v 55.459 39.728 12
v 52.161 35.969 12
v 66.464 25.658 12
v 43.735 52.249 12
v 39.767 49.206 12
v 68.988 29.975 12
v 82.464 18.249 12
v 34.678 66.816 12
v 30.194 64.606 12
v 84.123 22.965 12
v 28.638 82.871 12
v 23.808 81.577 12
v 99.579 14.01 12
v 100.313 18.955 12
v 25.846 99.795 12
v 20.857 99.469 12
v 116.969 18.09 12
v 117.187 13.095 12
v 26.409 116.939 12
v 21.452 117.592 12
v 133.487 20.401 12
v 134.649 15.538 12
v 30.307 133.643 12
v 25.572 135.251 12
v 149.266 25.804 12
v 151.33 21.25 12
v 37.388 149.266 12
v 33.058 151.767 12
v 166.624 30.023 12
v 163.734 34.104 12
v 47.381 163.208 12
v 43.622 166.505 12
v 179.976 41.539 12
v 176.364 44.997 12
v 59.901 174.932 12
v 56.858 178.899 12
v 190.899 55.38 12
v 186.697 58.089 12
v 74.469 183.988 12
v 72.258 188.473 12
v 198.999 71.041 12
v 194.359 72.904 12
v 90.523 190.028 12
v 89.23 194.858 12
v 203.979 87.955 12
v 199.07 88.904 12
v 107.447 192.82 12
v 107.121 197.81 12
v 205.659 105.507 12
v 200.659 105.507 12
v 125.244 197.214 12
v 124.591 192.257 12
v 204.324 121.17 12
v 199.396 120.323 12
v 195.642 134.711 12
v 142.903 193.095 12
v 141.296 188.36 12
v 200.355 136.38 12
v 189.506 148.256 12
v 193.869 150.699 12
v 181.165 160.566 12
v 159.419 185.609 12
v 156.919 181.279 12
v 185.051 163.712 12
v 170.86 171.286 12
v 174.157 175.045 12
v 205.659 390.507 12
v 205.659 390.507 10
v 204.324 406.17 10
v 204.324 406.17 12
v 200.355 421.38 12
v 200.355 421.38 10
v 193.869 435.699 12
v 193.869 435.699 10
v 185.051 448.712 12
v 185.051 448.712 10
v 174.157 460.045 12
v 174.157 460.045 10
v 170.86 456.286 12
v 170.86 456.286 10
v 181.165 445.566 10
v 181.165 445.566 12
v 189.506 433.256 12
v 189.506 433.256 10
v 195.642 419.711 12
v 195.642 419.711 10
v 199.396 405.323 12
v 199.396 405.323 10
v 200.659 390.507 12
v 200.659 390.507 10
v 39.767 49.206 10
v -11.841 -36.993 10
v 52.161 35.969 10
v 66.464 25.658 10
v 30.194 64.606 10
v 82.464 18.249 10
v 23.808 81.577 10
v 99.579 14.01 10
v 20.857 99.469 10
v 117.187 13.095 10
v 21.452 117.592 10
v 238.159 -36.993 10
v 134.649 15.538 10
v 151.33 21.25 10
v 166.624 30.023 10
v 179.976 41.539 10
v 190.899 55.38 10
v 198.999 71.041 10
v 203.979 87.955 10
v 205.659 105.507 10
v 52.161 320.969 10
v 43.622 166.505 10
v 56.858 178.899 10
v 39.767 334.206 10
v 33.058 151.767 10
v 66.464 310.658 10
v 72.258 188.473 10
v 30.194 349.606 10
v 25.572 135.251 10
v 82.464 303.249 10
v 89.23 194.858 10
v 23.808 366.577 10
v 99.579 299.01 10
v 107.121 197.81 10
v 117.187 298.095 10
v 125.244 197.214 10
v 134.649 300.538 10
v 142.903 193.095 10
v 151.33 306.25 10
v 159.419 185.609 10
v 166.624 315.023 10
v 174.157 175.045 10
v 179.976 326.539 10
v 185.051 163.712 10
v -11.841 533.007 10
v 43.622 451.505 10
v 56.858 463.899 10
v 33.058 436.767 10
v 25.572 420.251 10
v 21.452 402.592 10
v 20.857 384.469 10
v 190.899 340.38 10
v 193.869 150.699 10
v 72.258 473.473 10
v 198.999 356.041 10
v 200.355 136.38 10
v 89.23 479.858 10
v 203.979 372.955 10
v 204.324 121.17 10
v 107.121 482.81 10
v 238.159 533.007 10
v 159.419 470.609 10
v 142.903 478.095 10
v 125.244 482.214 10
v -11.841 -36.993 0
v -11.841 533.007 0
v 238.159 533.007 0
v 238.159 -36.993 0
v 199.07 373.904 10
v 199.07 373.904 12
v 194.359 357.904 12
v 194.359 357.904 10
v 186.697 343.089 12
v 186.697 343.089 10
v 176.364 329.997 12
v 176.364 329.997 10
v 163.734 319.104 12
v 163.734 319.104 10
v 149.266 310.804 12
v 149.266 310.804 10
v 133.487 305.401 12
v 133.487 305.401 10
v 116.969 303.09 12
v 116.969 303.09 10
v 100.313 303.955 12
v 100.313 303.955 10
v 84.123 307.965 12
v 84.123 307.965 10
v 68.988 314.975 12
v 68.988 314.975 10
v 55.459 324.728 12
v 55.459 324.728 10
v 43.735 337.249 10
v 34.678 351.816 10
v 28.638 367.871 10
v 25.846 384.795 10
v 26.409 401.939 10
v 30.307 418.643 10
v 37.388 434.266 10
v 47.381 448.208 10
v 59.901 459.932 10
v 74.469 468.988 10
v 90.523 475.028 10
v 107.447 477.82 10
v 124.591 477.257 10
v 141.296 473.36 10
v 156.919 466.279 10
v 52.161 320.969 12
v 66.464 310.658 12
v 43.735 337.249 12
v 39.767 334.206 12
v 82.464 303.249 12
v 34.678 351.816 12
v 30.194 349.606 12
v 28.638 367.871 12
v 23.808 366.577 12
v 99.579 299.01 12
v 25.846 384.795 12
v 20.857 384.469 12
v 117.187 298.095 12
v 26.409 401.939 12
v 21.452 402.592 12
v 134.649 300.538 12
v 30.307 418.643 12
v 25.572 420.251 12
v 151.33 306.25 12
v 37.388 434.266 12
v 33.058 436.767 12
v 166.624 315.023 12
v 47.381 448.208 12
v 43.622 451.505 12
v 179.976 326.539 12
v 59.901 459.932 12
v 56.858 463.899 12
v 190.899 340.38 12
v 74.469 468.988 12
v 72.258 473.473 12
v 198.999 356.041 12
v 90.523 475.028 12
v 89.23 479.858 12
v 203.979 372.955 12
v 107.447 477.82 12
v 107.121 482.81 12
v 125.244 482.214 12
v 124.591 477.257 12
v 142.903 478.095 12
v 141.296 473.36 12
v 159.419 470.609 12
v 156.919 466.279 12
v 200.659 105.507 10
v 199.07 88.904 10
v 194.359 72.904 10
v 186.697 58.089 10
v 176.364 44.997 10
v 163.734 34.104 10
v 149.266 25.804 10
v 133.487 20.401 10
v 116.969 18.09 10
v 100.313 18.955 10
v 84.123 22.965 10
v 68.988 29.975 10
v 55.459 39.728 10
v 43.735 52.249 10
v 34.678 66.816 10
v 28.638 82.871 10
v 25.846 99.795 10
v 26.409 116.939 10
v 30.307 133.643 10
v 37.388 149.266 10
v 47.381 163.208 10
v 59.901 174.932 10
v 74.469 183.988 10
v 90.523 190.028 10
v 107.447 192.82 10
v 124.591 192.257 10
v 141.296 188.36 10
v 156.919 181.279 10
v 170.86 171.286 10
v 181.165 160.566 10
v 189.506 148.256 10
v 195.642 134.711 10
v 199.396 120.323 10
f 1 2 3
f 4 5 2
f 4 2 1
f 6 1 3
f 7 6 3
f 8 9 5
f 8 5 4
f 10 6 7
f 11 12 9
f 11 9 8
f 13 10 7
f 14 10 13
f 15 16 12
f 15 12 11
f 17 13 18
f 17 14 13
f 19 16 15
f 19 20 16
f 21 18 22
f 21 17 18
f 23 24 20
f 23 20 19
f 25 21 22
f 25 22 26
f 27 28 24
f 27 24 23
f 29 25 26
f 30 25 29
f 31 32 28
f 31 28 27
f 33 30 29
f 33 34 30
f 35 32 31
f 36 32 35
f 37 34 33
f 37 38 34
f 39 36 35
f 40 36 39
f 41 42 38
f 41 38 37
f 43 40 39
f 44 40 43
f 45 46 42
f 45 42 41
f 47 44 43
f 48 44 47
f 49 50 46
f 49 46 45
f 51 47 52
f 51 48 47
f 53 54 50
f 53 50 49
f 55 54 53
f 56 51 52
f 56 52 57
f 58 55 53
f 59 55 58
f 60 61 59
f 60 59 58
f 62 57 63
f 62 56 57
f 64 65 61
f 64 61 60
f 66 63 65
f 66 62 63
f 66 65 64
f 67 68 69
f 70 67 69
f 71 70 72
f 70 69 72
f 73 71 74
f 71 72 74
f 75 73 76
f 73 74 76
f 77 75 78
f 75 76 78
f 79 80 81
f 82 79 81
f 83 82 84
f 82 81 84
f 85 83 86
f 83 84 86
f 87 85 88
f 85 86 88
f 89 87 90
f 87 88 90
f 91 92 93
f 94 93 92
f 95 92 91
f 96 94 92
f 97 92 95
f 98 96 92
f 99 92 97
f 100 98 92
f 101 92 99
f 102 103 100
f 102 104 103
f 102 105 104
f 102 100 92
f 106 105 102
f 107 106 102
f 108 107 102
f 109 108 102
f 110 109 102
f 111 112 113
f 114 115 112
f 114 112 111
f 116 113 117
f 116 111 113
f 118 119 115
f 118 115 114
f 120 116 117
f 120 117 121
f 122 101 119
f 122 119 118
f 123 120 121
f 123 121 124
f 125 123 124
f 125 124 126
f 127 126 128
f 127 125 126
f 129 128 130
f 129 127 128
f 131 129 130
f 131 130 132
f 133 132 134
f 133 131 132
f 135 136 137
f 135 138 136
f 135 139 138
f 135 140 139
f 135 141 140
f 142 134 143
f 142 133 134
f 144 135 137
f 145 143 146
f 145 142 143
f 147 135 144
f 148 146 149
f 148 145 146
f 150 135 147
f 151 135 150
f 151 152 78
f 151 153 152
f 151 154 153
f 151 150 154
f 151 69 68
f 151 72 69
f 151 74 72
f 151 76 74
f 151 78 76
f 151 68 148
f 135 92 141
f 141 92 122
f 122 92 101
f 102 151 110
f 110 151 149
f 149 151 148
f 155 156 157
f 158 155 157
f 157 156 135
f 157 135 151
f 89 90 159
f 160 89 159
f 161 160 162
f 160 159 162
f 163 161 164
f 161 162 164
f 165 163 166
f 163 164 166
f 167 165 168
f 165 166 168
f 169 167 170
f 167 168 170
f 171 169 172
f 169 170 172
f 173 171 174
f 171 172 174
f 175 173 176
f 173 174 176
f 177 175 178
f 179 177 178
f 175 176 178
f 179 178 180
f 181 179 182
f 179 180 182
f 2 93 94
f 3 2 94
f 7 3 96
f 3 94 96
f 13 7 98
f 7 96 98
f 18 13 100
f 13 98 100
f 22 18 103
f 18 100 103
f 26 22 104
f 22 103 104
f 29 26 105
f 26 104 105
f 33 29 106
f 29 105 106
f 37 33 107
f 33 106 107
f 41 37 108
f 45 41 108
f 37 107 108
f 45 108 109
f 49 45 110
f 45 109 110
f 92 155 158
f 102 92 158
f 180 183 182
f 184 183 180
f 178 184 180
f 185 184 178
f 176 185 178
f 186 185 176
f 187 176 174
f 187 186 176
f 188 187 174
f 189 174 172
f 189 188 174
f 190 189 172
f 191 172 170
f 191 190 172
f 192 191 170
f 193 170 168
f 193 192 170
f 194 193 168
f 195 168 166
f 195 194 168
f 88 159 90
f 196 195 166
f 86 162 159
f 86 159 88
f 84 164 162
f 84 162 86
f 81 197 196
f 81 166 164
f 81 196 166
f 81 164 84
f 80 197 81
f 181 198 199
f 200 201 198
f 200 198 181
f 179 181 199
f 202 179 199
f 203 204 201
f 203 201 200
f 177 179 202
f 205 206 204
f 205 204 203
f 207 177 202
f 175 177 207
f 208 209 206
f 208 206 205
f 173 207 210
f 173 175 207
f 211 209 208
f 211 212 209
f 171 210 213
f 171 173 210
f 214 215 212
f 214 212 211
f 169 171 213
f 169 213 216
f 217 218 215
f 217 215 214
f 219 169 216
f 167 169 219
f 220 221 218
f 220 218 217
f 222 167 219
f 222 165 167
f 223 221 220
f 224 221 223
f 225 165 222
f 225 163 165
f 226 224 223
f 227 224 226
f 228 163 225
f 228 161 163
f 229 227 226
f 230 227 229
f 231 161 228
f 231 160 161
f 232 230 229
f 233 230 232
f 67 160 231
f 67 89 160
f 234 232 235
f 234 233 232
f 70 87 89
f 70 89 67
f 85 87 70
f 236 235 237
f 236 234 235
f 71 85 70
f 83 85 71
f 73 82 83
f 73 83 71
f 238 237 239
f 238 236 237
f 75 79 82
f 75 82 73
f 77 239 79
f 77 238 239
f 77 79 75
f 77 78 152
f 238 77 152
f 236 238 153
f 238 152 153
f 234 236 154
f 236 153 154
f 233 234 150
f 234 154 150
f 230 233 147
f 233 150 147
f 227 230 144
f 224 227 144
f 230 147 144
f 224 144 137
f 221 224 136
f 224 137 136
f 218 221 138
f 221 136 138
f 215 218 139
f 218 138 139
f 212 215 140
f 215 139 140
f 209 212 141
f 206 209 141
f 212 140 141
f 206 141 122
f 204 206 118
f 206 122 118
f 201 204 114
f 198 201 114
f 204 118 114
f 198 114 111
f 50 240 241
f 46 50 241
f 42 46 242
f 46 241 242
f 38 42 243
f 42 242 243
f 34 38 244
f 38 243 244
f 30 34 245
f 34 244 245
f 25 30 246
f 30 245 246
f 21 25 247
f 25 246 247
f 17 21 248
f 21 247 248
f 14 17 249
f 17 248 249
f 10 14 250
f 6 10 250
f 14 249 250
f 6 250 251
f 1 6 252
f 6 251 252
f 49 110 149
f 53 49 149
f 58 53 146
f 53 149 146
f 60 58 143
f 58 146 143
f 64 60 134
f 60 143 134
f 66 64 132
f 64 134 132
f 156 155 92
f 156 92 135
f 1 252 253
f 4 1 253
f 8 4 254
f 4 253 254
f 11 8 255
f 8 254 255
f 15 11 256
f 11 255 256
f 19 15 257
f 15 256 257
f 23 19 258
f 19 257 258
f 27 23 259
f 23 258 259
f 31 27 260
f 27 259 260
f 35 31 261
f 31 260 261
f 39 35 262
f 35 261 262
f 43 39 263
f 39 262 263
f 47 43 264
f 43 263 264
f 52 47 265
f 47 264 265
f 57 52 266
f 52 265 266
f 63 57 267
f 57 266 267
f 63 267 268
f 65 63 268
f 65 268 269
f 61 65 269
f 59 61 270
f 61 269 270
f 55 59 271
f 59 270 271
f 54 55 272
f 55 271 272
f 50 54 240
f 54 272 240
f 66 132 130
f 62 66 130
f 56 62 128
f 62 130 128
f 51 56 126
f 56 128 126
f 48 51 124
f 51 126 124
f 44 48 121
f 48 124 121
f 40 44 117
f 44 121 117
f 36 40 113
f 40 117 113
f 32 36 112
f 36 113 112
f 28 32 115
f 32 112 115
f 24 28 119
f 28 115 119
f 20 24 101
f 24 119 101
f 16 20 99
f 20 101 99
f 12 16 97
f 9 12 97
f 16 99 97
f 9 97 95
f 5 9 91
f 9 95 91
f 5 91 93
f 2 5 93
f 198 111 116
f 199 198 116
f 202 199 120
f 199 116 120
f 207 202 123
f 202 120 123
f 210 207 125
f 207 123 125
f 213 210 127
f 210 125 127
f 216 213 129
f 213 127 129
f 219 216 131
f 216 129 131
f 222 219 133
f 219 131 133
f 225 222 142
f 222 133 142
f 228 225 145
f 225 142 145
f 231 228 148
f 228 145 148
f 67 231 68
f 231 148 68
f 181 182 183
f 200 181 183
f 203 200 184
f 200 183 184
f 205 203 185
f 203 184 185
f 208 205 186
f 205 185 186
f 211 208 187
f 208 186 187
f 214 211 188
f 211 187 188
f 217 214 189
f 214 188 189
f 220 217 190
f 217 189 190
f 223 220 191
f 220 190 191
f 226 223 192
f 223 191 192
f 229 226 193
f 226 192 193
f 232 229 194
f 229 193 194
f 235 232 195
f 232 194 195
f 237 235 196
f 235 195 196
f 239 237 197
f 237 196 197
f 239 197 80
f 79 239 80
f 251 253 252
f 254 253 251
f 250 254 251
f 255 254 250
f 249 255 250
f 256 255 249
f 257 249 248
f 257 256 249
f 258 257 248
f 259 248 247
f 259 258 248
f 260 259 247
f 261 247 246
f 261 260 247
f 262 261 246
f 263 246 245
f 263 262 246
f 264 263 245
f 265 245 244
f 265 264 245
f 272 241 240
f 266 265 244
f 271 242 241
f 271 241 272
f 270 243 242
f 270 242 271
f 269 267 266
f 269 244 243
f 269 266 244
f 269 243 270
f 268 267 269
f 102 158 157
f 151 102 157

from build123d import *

# Parameters (mm, degrees)
F0_W     = 250
F0_H     = 570
F1_DEPTH = 10
F3_DEPTH = 2


with BuildPart() as f1:
    # F0 (on Top) → F1 (new body)
    with BuildSketch(Plane.XY):
        with Locations((113.159475, 248.007115)):
            Rectangle(F0_W, F0_H)
    extrude(amount=F1_DEPTH)

    # F2 (on face) → F3 (join)
    with BuildSketch(Plane.XY.offset(10)):
        with BuildLine():
            ThreePointArc((174.157473, 460.044833), (43.621757, 451.505113), (52.161477, 320.969397))
            Line((52.161477, 320.969397), (55.458666, 324.728192))
            ThreePointArc((55.458666, 324.728192), (47.380553, 448.207924), (170.860284, 456.286037))
            Line((170.860284, 456.286037), (174.157473, 460.044833))
        make_face()
        with BuildLine():
            Line((55.458666, 324.728192), (52.161477, 320.969397))
            ThreePointArc((52.161477, 320.969397), (151.32972, 306.249875), (205.659475, 390.507115))
            ThreePointArc((205.659475, 390.507115), (197.416714, 428.67736), (174.157473, 460.044833))
            Line((174.157473, 460.044833), (170.860284, 456.286037))
            ThreePointArc((170.860284, 456.286037), (192.862269, 426.614103), (200.659475, 390.507115))
            ThreePointArc((200.659475, 390.507115), (149.266463, 310.804321), (55.458666, 324.728192))
        make_face()
        with BuildLine():
            ThreePointArc((205.659475, 105.507115), (197.416714, 143.67736), (174.157473, 175.044833))
            Line((174.157473, 175.044833), (170.860284, 171.286037))
            ThreePointArc((170.860284, 171.286037), (192.862269, 141.614103), (200.659475, 105.507115))
            ThreePointArc((200.659475, 105.507115), (149.266463, 25.804321), (55.458666, 39.728192))
            Line((55.458666, 39.728192), (52.161477, 35.969397))
            ThreePointArc((52.161477, 35.969397), (151.32972, 21.249875), (205.659475, 105.507115))
        make_face()
        with BuildLine():
            Line((170.860284, 171.286037), (174.157473, 175.044833))
            ThreePointArc((174.157473, 175.044833), (43.621757, 166.505113), (52.161477, 35.969397))
            Line((52.161477, 35.969397), (55.458666, 39.728192))
            ThreePointArc((55.458666, 39.728192), (47.380553, 163.207924), (170.860284, 171.286037))
        make_face()
    extrude(amount=F3_DEPTH)


solid = f1.part
